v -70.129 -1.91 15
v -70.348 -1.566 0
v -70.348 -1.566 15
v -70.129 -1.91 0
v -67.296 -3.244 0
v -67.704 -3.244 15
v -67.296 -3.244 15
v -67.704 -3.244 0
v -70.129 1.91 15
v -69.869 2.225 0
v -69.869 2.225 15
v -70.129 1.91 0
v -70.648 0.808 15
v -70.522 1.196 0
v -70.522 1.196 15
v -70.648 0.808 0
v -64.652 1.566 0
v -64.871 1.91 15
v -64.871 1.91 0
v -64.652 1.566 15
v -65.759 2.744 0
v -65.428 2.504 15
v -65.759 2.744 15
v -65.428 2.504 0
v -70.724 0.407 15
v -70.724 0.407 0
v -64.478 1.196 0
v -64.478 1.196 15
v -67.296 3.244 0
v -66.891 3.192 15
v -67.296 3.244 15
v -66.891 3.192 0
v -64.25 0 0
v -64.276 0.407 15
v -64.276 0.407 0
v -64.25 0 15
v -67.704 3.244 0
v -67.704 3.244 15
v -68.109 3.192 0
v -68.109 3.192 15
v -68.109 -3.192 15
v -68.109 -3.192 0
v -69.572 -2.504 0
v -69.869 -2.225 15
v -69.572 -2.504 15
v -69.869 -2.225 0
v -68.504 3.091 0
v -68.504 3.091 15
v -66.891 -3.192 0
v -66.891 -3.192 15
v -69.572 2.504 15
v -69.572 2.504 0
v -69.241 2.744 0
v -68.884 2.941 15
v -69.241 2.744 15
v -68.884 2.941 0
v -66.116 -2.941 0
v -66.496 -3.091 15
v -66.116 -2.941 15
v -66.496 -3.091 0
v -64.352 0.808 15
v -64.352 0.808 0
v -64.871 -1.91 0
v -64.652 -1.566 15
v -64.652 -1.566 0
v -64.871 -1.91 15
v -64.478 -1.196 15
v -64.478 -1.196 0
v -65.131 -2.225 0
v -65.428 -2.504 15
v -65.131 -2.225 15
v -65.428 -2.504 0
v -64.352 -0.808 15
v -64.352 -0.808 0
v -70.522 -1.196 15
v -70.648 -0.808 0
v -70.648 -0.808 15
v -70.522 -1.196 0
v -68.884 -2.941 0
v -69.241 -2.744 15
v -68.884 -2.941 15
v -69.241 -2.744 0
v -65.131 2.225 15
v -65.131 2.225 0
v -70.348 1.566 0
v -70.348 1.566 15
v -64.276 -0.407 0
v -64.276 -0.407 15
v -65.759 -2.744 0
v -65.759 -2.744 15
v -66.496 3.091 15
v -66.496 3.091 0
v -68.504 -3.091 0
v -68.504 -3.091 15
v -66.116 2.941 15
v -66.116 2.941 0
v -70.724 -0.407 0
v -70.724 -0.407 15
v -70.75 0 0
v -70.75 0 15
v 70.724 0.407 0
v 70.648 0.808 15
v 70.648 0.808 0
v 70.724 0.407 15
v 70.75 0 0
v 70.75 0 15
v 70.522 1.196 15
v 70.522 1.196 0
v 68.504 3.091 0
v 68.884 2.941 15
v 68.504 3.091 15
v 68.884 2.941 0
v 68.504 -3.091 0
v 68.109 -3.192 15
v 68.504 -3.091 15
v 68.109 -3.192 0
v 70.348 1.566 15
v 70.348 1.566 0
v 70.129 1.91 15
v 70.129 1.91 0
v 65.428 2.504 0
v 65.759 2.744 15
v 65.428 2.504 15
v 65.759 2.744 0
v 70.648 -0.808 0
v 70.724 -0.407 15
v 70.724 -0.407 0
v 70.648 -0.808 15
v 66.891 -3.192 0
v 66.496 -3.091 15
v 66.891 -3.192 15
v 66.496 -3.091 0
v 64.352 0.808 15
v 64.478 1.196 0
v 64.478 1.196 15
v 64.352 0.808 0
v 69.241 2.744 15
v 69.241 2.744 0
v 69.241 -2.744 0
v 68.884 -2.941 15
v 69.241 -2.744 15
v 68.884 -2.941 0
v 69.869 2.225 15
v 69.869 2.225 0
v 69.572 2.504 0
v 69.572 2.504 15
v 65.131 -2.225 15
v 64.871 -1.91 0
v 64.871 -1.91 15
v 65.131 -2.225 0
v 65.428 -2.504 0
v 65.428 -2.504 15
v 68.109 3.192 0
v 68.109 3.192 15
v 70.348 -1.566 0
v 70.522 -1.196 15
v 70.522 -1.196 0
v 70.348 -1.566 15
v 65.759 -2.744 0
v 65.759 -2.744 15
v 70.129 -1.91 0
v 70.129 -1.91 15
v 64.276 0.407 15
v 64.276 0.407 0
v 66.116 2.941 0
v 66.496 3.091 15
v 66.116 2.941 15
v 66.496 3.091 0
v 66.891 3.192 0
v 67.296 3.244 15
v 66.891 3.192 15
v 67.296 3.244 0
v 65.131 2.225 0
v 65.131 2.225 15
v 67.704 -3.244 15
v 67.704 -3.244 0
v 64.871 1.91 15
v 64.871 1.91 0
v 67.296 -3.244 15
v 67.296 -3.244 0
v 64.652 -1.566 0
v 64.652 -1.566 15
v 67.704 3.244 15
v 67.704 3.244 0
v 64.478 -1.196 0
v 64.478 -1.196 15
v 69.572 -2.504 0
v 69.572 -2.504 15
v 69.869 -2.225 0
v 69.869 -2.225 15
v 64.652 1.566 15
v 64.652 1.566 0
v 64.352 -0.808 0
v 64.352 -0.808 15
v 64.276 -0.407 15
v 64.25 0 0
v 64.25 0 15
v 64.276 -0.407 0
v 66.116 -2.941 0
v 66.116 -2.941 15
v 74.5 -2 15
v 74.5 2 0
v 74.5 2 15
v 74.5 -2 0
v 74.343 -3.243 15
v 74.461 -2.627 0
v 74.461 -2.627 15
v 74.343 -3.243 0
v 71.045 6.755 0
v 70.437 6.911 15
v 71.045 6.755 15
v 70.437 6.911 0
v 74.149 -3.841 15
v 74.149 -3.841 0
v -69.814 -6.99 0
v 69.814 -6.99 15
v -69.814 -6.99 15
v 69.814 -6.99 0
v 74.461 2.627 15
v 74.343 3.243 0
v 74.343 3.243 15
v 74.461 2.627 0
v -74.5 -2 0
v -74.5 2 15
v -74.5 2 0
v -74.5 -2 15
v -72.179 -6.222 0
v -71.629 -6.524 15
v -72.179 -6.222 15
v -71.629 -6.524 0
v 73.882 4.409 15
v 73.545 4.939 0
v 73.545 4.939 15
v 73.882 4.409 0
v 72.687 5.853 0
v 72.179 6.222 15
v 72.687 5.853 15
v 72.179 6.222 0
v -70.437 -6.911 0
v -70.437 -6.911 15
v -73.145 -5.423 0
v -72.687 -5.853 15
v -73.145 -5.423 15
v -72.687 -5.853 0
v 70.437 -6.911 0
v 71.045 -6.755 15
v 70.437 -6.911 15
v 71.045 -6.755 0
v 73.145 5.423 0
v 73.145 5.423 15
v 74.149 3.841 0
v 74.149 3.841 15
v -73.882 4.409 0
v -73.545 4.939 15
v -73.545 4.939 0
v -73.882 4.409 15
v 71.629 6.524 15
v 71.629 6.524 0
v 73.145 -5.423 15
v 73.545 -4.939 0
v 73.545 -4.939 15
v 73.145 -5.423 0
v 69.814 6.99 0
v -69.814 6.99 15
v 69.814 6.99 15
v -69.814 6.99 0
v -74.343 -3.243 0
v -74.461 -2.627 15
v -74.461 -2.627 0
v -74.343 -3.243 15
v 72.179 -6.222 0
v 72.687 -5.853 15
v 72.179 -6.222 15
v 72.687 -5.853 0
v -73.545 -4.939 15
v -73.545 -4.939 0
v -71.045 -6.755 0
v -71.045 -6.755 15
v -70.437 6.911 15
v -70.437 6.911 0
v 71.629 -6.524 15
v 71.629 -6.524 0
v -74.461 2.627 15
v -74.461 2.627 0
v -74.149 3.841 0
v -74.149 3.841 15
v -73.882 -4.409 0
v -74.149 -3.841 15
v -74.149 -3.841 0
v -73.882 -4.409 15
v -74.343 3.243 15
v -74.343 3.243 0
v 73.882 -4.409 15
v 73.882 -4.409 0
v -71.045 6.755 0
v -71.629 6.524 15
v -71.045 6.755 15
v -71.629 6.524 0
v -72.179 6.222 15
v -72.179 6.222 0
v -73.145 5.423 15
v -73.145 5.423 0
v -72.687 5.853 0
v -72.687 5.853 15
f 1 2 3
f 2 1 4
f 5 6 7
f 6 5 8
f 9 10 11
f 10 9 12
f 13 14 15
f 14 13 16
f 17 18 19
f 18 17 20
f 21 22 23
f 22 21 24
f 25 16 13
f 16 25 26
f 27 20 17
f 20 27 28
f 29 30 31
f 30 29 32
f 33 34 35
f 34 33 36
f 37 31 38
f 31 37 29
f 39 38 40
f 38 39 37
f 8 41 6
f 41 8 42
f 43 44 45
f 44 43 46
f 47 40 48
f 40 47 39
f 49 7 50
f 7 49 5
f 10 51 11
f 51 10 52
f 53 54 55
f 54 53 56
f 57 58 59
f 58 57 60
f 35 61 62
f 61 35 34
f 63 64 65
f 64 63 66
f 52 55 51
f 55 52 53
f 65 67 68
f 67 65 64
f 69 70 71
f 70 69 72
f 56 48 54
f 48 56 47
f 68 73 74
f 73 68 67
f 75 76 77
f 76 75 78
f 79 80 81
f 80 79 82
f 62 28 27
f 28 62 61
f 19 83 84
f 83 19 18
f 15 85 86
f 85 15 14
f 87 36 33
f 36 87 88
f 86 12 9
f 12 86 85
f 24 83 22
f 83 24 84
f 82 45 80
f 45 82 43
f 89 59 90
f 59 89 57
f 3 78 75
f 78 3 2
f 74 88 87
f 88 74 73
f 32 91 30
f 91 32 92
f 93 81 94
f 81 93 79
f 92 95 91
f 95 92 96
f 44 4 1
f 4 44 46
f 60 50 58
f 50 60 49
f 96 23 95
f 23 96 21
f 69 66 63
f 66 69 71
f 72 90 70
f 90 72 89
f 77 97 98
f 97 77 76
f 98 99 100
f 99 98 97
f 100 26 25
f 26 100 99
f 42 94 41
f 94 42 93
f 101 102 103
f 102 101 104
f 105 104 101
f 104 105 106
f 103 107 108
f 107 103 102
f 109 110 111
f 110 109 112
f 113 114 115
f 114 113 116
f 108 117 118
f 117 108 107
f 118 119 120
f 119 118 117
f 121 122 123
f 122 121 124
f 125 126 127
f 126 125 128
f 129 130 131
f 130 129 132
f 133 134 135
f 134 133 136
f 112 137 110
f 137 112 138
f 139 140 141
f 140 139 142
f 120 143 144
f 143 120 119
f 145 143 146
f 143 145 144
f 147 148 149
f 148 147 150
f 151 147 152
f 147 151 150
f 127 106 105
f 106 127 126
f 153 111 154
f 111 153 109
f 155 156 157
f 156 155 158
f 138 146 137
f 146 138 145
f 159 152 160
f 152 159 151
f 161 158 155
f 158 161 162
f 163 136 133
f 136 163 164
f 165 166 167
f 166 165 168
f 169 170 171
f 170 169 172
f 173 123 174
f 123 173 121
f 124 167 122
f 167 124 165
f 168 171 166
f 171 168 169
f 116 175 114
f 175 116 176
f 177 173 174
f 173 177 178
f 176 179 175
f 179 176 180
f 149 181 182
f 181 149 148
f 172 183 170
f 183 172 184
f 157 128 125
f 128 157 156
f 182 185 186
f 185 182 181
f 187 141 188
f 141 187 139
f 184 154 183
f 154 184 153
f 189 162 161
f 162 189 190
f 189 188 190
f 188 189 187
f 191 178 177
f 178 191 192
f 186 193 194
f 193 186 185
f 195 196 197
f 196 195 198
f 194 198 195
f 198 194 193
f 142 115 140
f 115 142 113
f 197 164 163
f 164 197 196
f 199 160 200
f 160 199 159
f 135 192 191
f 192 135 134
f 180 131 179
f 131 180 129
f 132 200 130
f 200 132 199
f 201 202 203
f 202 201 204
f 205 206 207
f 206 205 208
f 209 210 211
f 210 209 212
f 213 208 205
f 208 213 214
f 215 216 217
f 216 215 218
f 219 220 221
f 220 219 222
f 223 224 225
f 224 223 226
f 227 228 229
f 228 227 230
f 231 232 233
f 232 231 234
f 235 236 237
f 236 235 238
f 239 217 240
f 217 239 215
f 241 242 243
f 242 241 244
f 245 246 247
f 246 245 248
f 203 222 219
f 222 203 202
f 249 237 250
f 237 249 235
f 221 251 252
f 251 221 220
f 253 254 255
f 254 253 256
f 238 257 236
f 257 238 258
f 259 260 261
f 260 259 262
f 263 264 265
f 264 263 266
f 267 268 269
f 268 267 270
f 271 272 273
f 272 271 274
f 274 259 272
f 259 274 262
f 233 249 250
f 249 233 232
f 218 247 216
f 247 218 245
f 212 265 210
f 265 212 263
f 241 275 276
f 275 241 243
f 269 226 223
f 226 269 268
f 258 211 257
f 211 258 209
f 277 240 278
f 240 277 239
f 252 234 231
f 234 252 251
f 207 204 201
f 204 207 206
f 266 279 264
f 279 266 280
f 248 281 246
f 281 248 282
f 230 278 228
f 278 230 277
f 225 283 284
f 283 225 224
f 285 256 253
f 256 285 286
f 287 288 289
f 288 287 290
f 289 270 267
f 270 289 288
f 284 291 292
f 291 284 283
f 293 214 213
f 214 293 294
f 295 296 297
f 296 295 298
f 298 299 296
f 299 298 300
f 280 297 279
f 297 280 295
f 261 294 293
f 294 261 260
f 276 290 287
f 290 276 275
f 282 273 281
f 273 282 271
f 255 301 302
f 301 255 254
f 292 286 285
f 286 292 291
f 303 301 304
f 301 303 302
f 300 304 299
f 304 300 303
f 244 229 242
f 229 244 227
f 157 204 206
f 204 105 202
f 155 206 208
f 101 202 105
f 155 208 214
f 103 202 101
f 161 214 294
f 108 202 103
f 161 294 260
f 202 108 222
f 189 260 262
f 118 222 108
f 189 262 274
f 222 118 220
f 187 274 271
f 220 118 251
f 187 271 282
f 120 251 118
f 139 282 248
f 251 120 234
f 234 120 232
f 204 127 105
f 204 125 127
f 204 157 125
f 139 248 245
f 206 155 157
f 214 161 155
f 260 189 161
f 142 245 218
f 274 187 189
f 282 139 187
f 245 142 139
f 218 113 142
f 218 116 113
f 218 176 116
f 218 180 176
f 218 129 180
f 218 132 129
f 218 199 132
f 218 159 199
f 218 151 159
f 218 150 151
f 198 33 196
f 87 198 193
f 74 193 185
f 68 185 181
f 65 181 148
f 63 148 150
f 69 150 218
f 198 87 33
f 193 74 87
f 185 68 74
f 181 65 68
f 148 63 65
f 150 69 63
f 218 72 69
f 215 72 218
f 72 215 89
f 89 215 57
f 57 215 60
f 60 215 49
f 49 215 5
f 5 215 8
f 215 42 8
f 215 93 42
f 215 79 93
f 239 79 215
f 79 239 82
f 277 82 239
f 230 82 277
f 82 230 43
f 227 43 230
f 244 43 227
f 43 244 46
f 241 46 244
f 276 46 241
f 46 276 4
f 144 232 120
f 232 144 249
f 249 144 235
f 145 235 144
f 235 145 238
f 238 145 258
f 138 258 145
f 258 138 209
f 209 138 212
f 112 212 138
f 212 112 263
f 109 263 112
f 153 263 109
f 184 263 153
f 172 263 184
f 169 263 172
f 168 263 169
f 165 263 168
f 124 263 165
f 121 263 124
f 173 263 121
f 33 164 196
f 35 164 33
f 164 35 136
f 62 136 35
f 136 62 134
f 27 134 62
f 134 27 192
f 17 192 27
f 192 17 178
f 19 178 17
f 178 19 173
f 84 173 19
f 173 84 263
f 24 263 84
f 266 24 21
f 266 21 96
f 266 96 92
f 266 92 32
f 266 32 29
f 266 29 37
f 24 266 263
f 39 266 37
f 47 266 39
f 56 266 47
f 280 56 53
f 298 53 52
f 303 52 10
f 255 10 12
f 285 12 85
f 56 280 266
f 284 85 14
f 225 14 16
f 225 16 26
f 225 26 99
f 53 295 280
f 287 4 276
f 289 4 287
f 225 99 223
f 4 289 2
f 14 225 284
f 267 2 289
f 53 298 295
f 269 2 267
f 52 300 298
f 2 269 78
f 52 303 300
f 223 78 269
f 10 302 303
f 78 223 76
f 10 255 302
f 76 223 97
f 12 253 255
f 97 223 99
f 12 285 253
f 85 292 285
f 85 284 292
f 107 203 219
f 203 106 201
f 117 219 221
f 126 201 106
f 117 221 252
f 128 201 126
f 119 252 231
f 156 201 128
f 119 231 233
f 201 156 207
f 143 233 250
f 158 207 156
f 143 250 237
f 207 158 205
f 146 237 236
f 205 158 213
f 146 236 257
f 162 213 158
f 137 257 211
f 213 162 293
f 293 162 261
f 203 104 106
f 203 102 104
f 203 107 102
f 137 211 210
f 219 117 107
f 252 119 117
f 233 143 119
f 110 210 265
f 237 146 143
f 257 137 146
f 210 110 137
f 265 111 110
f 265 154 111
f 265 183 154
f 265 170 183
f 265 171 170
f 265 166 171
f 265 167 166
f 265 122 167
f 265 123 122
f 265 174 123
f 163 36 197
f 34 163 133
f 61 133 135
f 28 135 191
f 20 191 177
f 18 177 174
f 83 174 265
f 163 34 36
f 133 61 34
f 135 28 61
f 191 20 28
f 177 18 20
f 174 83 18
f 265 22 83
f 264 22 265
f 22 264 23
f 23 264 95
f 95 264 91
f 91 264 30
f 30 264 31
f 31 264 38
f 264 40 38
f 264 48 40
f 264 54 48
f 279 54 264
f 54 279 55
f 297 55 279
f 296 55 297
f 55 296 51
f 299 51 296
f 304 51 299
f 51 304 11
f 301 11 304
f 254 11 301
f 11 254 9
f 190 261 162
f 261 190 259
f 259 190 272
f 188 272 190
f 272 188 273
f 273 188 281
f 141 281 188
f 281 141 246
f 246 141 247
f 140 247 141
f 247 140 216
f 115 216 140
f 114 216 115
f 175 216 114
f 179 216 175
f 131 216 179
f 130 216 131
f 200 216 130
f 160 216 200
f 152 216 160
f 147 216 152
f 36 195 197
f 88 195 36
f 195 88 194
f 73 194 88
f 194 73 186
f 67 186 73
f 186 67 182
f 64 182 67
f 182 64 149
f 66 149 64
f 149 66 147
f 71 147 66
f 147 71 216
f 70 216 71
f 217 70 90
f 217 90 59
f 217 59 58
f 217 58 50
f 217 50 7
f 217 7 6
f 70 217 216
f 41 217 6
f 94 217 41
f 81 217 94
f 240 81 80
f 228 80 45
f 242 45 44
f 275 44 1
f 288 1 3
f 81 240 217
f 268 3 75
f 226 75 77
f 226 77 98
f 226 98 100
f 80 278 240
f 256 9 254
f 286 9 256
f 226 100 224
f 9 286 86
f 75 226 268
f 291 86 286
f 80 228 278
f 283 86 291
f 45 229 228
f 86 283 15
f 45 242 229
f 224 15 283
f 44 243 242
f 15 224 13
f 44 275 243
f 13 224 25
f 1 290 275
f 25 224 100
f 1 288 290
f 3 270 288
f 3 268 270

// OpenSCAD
$fn = 50;


difference() {
	union() {
		hull() {
			translate(v = [-69.5000000000, 2.0000000000, 0]) {
				cylinder(h = 15, r = 5);
			}
			translate(v = [69.5000000000, 2.0000000000, 0]) {
				cylinder(h = 15, r = 5);
			}
			translate(v = [-69.5000000000, -2.0000000000, 0]) {
				cylinder(h = 15, r = 5);
			}
			translate(v = [69.5000000000, -2.0000000000, 0]) {
				cylinder(h = 15, r = 5);
			}
		}
	}
	union() {
		translate(v = [-67.5000000000, 0.0000000000, -100.0000000000]) {
			cylinder(h = 200, r = 3.2500000000);
		}
		translate(v = [-67.5000000000, 0.0000000000, -100.0000000000]) {
			cylinder(h = 200, r = 3.2500000000);
		}
		translate(v = [67.5000000000, 0.0000000000, -100.0000000000]) {
			cylinder(h = 200, r = 3.2500000000);
		}
		translate(v = [67.5000000000, 0.0000000000, -100.0000000000]) {
			cylinder(h = 200, r = 3.2500000000);
		}
	}
}
